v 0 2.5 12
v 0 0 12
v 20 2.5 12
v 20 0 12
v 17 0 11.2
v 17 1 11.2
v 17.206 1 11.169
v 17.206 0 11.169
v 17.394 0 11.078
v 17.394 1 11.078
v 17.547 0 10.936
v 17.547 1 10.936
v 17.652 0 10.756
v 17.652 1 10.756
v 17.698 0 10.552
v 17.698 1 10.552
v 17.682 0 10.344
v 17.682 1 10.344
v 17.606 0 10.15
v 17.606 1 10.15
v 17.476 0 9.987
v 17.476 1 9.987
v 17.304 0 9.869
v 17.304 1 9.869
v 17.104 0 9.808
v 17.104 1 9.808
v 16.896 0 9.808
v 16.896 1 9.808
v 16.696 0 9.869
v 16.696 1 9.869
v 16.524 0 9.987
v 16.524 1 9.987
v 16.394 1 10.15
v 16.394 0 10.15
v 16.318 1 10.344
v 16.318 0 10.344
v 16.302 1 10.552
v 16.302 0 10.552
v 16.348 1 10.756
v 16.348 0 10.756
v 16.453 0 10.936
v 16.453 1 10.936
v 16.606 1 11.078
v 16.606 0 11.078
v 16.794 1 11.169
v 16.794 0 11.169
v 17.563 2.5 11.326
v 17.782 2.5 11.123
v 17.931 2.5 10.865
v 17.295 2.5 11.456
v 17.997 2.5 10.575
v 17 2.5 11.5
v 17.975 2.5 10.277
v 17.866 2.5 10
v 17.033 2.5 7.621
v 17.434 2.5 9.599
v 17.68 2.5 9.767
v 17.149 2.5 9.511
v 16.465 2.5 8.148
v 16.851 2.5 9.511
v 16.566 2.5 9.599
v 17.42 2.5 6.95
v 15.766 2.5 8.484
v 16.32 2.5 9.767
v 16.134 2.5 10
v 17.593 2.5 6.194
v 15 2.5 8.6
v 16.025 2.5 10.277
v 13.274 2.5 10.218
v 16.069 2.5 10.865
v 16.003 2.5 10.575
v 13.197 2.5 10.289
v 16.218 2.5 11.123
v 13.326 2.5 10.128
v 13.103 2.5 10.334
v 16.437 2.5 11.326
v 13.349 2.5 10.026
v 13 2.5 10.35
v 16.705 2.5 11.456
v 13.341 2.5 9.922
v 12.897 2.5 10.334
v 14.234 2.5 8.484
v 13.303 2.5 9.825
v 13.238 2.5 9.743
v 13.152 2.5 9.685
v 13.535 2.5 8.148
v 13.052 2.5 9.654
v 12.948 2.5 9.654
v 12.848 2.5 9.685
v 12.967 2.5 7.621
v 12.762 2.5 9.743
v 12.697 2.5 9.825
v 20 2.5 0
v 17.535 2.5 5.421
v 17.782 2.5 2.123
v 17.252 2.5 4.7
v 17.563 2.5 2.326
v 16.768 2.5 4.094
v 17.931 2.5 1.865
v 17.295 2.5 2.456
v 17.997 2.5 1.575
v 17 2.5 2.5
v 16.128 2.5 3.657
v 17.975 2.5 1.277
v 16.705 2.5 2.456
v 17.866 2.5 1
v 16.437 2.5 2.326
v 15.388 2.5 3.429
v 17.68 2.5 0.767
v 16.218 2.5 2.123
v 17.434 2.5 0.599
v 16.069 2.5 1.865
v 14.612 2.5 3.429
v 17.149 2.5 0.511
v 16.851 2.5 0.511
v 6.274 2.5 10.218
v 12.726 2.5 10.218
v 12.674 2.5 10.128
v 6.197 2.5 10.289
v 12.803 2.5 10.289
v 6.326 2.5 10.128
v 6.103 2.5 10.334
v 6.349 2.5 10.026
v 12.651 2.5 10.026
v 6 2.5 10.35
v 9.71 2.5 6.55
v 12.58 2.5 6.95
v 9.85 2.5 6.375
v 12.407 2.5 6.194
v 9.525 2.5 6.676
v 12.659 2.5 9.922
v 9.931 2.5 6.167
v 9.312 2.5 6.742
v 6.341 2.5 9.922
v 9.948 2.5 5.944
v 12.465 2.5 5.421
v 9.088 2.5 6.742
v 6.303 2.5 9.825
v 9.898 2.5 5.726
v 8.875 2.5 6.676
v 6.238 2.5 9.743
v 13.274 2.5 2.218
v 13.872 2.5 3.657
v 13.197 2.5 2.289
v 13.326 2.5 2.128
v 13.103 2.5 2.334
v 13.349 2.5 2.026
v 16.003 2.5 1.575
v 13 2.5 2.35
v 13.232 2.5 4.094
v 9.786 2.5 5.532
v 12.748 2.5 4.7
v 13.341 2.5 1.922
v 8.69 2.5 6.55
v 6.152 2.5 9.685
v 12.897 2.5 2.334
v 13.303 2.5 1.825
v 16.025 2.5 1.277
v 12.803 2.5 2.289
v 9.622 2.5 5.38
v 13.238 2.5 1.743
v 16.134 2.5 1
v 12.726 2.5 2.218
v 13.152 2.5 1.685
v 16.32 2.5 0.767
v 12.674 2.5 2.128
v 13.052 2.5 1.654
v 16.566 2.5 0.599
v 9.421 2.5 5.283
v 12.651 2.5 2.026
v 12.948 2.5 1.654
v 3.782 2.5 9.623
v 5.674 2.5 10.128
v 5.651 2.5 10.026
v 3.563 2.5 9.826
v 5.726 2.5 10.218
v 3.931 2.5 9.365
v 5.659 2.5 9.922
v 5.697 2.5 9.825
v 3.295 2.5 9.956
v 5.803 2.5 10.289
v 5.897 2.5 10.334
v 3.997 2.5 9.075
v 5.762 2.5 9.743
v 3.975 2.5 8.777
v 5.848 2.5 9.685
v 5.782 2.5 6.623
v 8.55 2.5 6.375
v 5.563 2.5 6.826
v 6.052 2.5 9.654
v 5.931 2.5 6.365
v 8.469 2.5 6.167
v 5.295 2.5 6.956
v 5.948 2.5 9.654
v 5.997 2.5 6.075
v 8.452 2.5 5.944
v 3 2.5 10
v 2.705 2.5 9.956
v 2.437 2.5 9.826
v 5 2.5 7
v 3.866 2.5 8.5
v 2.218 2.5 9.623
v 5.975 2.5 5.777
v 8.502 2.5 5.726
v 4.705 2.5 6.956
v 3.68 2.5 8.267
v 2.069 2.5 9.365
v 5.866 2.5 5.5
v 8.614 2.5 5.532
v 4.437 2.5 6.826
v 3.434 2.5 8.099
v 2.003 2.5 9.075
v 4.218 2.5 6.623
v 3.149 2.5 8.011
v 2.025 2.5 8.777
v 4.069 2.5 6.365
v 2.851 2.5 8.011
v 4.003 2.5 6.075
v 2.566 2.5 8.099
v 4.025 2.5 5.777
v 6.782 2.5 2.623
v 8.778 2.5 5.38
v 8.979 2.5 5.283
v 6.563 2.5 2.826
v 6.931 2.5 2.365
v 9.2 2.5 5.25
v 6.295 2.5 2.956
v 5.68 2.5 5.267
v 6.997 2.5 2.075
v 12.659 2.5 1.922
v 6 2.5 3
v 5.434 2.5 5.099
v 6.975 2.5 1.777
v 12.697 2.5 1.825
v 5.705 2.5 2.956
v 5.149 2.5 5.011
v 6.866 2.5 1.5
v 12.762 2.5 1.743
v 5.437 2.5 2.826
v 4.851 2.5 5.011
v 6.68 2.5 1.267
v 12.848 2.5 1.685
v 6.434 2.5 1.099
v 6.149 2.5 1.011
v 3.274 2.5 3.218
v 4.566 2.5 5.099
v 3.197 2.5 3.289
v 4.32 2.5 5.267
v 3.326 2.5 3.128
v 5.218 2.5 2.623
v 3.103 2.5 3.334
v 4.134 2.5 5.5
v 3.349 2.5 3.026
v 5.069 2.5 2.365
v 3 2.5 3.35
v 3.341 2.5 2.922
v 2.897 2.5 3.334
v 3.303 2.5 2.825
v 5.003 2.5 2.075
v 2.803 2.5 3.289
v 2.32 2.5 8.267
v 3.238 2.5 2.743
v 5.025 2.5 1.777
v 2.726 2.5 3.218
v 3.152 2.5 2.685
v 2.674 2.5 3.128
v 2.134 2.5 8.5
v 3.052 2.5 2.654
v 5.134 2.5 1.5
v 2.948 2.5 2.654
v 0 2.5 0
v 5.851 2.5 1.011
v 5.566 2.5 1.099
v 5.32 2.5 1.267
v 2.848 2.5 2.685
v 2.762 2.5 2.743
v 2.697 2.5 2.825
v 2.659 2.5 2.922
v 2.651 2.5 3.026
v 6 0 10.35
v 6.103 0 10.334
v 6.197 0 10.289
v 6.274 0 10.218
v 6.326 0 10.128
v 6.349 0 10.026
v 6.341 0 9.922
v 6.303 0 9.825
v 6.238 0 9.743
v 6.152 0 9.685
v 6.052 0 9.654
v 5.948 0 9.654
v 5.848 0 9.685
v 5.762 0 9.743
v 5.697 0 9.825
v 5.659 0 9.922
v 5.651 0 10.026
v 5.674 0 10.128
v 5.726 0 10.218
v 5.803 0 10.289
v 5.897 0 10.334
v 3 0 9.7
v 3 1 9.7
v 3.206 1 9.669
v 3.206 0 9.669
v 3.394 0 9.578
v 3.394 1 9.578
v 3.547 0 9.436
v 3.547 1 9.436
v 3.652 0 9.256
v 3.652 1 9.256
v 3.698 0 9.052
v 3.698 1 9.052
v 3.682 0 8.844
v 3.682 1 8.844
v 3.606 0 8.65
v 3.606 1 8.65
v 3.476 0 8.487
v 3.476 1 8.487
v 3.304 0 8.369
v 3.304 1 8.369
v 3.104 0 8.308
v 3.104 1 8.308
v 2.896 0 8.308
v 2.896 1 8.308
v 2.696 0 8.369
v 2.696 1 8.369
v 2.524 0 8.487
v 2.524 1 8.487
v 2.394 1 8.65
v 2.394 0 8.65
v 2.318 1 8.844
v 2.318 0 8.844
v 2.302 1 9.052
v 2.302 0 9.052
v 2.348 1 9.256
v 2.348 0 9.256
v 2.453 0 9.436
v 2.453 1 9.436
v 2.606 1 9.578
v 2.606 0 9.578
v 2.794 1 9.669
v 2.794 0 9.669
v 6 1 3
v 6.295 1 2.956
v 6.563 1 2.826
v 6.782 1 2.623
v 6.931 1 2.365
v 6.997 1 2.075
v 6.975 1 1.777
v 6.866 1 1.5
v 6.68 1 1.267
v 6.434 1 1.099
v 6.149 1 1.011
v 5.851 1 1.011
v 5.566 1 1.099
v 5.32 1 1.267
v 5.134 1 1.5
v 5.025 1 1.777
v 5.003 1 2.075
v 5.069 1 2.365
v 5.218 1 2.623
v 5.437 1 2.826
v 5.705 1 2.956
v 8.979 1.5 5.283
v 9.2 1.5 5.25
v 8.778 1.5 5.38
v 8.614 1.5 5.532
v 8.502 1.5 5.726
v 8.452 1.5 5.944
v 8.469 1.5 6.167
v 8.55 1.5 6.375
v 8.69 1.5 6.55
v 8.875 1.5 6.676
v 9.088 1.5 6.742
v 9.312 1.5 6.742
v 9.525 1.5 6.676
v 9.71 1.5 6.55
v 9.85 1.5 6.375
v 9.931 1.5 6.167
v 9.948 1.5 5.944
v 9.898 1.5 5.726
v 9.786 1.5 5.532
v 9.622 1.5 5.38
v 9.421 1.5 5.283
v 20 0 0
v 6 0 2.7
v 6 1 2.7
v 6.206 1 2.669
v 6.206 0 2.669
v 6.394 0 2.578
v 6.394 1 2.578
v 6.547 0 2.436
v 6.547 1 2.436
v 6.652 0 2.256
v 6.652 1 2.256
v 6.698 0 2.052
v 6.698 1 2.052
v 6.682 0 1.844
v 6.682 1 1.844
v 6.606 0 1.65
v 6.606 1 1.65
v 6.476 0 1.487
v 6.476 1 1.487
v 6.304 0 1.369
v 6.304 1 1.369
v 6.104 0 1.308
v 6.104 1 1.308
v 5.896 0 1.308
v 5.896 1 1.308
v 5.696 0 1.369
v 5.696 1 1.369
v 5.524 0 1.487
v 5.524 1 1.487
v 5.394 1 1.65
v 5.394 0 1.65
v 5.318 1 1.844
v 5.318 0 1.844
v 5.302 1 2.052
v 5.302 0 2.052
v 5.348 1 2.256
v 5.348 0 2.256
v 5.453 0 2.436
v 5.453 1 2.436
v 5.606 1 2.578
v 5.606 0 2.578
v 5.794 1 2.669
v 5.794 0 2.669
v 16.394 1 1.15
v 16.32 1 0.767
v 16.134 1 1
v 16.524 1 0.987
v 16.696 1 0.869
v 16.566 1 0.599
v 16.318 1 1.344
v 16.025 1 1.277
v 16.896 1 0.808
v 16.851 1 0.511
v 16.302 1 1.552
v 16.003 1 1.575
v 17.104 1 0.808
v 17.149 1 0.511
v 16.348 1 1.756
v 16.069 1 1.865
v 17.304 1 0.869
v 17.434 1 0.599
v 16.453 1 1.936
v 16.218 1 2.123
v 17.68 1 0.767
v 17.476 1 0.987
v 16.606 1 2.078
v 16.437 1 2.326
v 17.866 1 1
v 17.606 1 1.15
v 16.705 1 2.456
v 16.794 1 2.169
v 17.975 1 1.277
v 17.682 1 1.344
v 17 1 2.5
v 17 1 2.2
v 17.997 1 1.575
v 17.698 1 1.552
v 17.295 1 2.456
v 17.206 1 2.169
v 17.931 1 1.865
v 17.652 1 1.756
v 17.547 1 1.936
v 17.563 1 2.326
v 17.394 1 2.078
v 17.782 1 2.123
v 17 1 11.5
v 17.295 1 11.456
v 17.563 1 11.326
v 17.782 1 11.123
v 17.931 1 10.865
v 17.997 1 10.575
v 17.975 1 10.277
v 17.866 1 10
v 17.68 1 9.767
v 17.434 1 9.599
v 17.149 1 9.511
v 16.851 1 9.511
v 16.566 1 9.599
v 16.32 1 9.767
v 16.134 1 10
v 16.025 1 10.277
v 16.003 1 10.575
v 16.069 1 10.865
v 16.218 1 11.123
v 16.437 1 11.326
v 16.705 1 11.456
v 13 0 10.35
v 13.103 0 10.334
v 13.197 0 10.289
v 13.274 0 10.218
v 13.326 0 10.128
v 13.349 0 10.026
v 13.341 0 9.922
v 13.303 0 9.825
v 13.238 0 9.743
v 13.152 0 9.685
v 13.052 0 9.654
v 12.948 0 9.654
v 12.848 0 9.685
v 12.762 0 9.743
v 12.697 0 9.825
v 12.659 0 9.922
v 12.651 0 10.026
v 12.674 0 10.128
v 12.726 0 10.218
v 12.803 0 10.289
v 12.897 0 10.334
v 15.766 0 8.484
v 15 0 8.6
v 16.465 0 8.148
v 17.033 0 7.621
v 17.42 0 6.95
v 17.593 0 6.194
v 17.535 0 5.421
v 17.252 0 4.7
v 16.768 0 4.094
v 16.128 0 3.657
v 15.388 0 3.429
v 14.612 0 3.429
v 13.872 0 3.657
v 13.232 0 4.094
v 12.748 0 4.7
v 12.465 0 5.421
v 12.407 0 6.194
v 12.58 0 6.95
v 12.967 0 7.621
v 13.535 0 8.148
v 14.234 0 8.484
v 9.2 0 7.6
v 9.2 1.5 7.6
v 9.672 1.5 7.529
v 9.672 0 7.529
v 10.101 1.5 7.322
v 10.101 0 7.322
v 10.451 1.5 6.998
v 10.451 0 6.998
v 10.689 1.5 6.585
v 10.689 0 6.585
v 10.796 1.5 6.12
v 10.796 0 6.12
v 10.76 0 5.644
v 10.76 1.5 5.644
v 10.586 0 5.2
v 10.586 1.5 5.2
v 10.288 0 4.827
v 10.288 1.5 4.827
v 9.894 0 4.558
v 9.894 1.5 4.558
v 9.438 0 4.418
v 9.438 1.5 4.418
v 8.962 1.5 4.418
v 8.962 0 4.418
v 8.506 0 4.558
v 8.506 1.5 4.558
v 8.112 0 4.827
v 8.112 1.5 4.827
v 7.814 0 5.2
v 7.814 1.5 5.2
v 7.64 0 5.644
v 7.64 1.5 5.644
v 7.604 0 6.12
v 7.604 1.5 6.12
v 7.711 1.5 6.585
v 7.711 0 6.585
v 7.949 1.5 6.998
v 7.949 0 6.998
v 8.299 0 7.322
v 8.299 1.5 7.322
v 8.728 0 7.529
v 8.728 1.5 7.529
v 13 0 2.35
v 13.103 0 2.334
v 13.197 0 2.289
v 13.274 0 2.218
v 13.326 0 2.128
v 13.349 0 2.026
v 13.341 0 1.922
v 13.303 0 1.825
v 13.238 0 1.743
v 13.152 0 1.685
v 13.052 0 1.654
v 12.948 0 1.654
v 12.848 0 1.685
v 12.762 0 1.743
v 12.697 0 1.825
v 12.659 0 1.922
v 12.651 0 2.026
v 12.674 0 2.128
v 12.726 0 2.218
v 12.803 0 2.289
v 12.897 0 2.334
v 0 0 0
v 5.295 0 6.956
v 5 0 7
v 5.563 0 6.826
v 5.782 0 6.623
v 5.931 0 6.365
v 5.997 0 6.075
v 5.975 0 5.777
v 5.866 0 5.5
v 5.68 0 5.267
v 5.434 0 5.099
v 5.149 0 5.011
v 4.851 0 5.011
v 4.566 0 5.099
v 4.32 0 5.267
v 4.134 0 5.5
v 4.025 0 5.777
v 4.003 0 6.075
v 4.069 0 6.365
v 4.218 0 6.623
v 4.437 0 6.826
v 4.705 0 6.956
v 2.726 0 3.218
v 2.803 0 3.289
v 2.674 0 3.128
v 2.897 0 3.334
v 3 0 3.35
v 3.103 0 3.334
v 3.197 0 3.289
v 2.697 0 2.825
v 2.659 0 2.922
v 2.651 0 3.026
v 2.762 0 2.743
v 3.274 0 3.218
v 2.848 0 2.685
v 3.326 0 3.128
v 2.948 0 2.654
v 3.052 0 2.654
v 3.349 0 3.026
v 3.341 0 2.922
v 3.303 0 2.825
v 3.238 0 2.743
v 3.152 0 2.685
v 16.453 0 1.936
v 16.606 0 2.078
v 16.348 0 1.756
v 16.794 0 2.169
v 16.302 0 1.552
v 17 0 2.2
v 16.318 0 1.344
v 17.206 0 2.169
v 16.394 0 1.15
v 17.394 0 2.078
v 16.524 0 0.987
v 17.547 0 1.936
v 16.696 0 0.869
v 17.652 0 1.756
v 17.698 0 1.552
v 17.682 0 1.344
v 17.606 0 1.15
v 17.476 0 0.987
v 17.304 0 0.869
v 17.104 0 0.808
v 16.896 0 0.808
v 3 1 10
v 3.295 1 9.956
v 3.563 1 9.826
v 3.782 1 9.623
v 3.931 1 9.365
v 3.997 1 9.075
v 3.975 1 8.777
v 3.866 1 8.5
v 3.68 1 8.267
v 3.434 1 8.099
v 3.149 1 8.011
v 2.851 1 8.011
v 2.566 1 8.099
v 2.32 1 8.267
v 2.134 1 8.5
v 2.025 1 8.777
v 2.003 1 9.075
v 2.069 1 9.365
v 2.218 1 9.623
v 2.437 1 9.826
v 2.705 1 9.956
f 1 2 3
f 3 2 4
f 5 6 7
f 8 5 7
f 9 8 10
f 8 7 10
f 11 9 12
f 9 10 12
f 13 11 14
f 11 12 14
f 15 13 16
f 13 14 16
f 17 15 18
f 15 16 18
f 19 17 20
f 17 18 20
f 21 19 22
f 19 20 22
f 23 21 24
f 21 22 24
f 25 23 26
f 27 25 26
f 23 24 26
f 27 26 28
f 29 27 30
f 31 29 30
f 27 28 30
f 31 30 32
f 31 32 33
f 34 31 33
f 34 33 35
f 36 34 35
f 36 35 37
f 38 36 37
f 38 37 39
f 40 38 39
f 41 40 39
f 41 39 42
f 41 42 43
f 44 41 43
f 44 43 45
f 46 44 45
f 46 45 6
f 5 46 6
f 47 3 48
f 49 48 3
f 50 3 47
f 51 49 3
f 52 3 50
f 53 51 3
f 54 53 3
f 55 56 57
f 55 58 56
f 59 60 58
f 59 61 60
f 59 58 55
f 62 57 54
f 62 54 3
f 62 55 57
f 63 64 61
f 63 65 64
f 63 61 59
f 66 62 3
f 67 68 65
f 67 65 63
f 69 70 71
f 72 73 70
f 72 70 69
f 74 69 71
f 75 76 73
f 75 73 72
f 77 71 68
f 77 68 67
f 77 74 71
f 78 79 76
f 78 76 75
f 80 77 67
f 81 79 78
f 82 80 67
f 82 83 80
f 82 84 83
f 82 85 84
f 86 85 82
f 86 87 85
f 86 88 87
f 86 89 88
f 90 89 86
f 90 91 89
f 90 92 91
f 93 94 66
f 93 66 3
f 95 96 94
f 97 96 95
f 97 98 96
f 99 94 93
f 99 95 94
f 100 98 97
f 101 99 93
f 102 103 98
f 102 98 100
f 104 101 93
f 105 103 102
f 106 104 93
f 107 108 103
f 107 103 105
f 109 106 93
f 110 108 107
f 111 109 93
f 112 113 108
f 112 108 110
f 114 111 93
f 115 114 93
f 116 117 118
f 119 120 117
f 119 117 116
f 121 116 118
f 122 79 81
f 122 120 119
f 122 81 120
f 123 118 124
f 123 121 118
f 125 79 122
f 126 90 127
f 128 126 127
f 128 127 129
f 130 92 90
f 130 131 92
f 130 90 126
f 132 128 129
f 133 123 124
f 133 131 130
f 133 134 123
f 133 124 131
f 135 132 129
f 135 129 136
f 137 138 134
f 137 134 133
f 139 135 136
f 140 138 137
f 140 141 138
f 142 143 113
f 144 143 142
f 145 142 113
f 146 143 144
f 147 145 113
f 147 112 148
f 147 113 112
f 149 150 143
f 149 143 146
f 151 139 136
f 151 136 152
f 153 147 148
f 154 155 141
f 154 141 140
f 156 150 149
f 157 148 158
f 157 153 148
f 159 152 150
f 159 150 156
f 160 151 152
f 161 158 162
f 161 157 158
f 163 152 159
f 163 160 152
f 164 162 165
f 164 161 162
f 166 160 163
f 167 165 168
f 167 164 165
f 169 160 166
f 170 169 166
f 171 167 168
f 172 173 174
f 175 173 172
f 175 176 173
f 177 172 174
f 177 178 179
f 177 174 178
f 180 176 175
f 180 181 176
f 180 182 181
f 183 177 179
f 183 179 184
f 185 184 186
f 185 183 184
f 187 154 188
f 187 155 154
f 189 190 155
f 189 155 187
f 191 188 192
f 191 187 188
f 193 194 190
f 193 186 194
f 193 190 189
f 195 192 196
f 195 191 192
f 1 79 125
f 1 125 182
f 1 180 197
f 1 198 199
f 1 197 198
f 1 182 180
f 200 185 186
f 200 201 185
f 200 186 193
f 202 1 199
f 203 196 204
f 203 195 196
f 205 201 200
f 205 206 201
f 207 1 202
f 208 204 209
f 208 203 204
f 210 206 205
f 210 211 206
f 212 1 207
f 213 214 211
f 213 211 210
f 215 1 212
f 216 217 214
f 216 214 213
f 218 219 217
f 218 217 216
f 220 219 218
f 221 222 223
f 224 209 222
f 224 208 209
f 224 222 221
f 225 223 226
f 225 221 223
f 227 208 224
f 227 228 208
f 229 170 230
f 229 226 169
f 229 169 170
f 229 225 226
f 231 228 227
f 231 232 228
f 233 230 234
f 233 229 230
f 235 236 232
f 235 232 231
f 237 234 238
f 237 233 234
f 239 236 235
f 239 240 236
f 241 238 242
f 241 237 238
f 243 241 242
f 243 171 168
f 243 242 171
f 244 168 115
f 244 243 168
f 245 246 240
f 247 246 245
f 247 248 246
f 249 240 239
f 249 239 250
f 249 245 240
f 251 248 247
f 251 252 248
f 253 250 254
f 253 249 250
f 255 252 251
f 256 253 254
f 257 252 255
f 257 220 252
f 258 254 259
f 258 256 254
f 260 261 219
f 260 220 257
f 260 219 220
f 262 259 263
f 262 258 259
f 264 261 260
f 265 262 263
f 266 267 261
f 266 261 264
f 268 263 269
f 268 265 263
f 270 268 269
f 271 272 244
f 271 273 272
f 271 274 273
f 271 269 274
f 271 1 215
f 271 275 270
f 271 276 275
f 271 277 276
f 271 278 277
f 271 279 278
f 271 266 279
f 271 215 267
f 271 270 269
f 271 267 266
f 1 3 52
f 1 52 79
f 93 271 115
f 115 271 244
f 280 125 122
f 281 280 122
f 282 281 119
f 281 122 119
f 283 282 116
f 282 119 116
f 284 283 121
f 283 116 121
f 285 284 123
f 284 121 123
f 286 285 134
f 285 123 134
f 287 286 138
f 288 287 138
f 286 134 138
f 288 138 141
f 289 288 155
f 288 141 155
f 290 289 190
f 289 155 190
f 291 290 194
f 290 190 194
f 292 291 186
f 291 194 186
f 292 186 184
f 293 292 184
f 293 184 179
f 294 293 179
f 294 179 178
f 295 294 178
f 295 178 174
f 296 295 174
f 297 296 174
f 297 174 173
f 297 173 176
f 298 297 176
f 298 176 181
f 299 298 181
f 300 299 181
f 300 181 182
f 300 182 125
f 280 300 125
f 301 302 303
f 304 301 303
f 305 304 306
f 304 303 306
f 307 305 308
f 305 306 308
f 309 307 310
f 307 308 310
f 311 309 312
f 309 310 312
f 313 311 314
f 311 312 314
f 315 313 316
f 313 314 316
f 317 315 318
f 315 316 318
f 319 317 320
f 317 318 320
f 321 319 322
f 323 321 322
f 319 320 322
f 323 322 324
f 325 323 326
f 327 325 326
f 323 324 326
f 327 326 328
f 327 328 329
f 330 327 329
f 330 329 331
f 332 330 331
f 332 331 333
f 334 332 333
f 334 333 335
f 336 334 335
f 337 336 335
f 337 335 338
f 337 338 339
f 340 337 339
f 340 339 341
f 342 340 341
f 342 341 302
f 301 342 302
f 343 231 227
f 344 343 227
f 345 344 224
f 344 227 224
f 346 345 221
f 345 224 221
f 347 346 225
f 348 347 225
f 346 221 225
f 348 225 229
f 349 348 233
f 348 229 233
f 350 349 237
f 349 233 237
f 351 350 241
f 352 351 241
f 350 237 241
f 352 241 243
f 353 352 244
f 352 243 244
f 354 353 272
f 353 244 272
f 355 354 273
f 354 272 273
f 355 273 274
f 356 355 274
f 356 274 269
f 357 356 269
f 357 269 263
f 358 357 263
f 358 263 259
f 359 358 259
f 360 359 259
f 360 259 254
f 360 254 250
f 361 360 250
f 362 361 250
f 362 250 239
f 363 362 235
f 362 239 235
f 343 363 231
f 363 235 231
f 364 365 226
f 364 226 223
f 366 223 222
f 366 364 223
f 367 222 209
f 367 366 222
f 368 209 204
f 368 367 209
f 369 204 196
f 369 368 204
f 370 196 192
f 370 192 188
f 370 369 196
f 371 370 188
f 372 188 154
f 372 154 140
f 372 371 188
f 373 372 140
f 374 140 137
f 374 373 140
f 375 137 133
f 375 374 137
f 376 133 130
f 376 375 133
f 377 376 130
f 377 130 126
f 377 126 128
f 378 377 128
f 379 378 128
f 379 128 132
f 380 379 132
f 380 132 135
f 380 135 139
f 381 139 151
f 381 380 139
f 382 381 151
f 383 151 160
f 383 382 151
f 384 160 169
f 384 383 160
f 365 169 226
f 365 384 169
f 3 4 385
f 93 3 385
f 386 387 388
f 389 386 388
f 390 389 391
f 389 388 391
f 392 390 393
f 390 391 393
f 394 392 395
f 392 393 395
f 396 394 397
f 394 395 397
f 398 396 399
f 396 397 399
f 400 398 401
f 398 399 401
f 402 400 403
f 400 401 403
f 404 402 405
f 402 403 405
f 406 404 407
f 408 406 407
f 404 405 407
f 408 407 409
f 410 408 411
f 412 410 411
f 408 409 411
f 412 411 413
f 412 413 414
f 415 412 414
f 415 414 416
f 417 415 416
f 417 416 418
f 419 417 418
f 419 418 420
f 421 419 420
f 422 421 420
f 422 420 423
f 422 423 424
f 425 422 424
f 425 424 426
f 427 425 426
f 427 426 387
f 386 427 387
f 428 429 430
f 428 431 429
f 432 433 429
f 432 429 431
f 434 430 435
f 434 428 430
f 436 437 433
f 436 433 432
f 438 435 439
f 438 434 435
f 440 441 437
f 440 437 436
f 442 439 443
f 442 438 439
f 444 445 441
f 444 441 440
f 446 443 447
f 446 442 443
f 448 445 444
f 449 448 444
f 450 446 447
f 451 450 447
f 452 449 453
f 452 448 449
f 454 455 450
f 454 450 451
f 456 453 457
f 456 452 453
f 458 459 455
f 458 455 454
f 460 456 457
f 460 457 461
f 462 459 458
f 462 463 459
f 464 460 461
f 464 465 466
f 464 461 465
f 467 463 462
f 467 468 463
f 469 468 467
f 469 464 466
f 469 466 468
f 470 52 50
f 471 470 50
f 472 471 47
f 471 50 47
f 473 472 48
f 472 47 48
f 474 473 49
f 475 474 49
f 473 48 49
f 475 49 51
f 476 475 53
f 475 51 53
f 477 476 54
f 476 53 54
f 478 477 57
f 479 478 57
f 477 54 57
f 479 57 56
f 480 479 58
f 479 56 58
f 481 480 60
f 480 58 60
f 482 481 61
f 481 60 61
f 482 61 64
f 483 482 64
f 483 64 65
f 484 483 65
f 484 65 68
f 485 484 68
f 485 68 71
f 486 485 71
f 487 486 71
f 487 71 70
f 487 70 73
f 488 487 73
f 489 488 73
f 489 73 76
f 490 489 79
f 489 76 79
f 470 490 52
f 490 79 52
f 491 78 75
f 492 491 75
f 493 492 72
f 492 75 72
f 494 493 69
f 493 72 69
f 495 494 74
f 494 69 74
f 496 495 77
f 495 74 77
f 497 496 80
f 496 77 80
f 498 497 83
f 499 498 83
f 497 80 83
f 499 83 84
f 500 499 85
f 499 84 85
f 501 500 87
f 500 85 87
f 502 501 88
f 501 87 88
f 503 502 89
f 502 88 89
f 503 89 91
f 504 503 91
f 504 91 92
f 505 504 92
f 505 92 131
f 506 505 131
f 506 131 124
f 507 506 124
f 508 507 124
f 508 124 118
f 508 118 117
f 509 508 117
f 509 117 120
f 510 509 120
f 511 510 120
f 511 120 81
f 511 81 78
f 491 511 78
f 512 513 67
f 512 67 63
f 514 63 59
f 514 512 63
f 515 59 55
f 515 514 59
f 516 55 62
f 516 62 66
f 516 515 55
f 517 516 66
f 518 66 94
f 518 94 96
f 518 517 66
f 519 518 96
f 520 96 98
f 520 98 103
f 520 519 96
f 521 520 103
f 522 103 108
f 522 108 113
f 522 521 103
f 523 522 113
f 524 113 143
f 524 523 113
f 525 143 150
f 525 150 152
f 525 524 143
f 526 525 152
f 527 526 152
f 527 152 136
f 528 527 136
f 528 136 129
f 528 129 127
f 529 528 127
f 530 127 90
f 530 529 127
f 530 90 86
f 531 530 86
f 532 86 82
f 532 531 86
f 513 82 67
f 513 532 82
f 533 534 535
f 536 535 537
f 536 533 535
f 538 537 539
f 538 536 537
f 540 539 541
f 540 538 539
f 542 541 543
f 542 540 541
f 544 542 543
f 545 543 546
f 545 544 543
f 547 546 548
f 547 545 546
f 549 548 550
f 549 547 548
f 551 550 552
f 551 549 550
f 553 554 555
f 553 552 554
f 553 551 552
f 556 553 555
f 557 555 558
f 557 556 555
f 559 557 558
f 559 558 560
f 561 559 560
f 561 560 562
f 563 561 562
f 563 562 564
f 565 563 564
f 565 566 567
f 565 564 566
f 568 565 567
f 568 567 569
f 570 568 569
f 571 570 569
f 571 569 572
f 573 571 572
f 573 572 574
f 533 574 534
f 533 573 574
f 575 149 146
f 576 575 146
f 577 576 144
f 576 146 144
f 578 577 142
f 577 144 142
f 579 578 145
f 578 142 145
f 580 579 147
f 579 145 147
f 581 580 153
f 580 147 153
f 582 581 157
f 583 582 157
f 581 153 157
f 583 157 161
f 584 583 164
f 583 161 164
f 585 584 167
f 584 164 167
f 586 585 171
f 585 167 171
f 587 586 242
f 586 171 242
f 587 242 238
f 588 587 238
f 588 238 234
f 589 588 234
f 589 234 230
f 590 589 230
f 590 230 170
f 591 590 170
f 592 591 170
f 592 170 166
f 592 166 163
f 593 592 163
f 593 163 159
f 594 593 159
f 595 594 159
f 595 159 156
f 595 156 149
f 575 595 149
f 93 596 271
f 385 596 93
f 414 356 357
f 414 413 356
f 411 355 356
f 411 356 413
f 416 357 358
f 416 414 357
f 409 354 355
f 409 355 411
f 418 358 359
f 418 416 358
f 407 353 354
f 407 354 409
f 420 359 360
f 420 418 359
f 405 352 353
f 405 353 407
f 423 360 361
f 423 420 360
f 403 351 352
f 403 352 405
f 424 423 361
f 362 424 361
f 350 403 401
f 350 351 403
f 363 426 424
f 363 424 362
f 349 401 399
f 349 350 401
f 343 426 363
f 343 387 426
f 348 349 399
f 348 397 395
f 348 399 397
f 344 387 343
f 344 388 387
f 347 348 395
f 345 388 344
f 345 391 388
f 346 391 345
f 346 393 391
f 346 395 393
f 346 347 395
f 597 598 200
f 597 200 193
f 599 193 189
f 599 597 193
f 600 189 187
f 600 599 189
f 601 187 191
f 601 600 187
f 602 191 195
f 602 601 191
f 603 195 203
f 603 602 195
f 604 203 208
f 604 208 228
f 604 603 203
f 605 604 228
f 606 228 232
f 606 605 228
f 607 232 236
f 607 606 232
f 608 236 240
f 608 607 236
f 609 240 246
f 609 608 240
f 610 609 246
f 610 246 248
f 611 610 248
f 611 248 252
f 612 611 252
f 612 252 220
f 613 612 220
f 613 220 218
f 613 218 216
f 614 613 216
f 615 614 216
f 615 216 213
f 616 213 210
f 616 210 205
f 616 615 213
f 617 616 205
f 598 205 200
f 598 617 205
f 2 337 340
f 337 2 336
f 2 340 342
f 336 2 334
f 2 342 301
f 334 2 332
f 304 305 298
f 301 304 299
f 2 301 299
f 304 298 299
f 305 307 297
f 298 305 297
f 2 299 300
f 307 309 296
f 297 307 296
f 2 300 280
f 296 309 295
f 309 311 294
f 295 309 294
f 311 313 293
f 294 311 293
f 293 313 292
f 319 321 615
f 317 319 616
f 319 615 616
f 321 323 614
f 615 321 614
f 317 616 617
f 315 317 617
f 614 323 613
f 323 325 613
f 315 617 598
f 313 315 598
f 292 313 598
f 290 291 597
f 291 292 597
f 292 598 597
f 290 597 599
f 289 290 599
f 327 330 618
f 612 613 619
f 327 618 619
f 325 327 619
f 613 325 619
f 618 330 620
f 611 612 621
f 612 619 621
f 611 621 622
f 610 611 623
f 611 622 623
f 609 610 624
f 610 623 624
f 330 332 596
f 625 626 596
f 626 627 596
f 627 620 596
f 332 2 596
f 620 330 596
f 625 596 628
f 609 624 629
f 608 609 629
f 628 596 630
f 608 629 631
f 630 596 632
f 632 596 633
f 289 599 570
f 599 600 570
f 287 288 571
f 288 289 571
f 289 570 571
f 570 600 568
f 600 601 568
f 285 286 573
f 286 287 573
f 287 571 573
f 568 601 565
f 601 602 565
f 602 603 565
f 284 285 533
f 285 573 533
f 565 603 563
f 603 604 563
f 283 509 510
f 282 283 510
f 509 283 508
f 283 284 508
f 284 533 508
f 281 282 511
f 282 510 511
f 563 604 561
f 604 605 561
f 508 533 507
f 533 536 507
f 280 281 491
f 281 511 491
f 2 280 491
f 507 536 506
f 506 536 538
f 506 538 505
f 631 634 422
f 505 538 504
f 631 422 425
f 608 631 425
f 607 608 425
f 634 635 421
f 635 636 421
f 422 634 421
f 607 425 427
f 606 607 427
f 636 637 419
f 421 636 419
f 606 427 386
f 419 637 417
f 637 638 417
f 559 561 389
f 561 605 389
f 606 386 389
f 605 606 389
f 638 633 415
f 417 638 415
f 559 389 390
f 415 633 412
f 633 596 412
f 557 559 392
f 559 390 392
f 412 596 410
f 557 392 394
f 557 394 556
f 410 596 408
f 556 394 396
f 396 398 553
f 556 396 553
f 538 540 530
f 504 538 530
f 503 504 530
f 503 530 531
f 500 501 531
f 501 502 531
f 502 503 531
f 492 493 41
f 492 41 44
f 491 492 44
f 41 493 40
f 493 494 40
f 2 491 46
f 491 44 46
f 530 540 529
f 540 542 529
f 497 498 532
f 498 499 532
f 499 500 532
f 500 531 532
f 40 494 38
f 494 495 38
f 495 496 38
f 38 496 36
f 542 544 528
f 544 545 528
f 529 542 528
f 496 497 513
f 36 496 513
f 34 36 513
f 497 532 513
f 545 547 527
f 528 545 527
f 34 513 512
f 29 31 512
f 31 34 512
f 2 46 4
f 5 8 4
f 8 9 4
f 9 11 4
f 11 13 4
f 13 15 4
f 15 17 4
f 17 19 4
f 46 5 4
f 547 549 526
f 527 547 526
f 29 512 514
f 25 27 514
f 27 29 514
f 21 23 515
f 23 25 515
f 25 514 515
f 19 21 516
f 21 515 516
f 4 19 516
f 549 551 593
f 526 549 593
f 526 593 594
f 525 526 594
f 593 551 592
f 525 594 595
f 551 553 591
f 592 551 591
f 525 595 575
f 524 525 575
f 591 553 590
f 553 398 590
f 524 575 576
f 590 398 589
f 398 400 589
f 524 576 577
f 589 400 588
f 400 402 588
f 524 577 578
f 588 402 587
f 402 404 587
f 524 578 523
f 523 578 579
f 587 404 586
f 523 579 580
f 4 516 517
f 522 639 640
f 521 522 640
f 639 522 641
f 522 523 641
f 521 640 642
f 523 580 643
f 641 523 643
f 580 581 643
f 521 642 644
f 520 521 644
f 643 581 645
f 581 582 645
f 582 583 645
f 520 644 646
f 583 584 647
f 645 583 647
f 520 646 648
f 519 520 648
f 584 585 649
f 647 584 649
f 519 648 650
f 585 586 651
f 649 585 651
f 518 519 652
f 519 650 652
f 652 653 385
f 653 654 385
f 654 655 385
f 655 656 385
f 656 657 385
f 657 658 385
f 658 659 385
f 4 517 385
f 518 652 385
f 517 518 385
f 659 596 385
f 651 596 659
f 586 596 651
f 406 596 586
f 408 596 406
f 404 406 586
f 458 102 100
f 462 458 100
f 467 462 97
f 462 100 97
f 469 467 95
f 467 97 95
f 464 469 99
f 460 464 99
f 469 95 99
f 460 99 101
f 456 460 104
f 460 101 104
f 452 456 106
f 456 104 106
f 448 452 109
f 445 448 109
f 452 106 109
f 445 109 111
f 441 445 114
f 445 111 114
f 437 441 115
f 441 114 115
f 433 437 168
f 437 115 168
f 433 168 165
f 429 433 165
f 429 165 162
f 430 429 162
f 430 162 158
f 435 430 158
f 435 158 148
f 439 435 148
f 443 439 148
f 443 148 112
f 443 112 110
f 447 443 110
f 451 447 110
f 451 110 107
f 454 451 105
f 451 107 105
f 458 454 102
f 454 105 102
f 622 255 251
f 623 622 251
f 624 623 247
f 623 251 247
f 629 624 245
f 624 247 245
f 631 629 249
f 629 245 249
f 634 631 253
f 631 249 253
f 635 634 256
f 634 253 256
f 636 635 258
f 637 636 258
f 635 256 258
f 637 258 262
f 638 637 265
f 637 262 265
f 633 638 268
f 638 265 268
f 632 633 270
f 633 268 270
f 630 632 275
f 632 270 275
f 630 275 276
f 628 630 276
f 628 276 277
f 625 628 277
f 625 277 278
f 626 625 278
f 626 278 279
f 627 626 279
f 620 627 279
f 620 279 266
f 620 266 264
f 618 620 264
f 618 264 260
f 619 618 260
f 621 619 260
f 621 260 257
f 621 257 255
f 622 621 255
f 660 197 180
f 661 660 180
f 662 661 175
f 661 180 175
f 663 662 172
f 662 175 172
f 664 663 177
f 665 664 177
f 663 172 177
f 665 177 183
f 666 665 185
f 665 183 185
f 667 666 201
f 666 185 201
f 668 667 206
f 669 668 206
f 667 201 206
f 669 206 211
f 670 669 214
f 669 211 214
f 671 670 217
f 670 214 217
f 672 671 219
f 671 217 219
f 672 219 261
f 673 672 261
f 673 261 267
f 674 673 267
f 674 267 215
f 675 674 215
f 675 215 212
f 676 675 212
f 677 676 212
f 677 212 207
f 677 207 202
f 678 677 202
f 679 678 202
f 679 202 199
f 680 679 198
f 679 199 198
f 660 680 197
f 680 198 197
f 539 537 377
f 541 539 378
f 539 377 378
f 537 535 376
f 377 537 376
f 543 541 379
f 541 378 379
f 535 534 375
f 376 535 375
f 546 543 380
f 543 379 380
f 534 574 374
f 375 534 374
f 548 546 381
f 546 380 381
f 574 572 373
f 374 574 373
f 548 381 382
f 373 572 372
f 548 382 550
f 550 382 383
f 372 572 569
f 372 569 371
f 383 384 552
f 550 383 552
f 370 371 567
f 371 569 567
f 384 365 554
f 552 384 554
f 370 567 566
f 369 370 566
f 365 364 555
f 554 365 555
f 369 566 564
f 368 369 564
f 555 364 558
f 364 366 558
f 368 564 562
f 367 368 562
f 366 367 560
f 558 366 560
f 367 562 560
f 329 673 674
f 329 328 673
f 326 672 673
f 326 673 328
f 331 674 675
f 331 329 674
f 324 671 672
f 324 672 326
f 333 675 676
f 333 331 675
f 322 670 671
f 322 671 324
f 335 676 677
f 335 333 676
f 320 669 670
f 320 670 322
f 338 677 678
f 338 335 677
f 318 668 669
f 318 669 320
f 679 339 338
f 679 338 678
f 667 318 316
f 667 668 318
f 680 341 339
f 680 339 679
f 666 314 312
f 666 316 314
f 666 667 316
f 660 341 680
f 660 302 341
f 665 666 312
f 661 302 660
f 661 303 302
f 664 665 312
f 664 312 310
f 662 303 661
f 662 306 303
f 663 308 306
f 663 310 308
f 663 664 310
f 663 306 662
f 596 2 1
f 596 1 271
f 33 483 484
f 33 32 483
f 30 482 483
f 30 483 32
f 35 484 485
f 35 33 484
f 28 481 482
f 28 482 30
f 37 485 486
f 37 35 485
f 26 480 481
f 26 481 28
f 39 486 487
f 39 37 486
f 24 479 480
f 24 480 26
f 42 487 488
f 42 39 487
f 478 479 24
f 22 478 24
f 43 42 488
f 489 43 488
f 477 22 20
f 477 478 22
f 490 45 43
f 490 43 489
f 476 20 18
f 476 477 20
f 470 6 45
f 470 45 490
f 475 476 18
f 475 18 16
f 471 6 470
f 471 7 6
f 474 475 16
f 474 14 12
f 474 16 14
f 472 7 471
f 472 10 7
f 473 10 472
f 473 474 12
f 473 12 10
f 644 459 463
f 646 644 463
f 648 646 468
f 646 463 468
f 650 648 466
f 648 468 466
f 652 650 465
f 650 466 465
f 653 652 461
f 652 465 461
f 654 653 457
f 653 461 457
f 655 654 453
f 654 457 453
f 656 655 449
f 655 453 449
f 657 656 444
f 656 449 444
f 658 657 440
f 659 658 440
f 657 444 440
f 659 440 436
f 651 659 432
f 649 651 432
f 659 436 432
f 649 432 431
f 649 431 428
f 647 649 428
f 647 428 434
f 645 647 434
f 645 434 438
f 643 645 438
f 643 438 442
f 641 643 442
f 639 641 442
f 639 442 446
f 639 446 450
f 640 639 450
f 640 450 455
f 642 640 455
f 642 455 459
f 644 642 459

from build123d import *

# Parameters (mm, degrees)
SKETCH_1_W          = 20
SKETCH_1_H          = 12
SKETCH_1_R          = 1.6
SKETCH_1_R_2        = 2.6
SKETCH_1_R_3        = 1
EXTRUDE_1_DEPTH     = 2.5
EXTRUDE_START       = 1.5
SKETCH_1_5_R        = 1.6
SKETCH_1_5_R_2      = 0.75
EXTRUDE_2_DEPTH     = 1
SKETCH_3_R          = 0.7
SKETCH_3_R_2        = 0.35
CUT_EXTRUDE_1_DEPTH = 24.457408211
SKETCH_3_3_R        = 1
CUT_EXTRUDE_2_DEPTH = 1.5


with BuildPart() as part:
    # 草图1 → 凸台-拉伸1 (new body)
    with BuildSketch(Plane(origin=(0, 0, 0), x_dir=(1, 0, 0), z_dir=(0, 1, 0))):
        with Locations((10, -6)):
            Rectangle(SKETCH_1_W, SKETCH_1_H)
        with Locations(Location((9.2, -6, 0), (0, 0, 270))):
            Circle(SKETCH_1_R, mode=Mode.SUBTRACT)
        with Locations(Location((15, -6, 0), (0, 0, 270))):
            Circle(SKETCH_1_R_2, mode=Mode.SUBTRACT)
        with Locations(Location((5, -6, 0), (0, 0, 270))):
            Circle(SKETCH_1_R_3, mode=Mode.SUBTRACT)
    extrude(amount=EXTRUDE_1_DEPTH)

    # 草图1<5> → 凸台-拉伸2 (add)
    with BuildSketch(Plane(origin=(0, 0, 0), x_dir=(1, 0, 0), z_dir=(0, 1, 0)).offset(EXTRUDE_START)):
        with Locations(Location((9.2, -6, 0), (0, 0, 90))):
            Circle(SKETCH_1_5_R)
        with Locations(Location((9.2, -6, 0), (0, 0, 90))):
            Circle(SKETCH_1_5_R_2, mode=Mode.SUBTRACT)
    extrude(amount=EXTRUDE_2_DEPTH)

    # 草图3 → 切除-拉伸1 (cut, through all)
    with BuildSketch(Plane(origin=(0, 2.5, 0), x_dir=(1, 0, 0), z_dir=(0, 1, 0))):
        with Locations(Location((3, -9, 0), (0, 0, 270))):
            Circle(SKETCH_3_R)
        with Locations(Location((6, -2, 0), (0, 0, 270))):
            Circle(SKETCH_3_R)
        with Locations(Location((17, -1.5, 0), (0, 0, 270))):
            Circle(SKETCH_3_R)
        with Locations(Location((17, -10.5, 0), (0, 0, 270))):
            Circle(SKETCH_3_R)
        with Locations(Location((3, -3, 0), (0, 0, 270))):
            Circle(SKETCH_3_R_2)
        with Locations(Location((6, -10, 0), (0, 0, 270))):
            Circle(SKETCH_3_R_2)
        with Locations(Location((13, -10, 0), (0, 0, 270))):
            Circle(SKETCH_3_R_2)
        with Locations(Location((13, -2, 0), (0, 0, 270))):
            Circle(SKETCH_3_R_2)
    extrude(amount=-CUT_EXTRUDE_1_DEPTH, mode=Mode.SUBTRACT)

    # 草图3<3> → 切除-拉伸2 (cut)
    with BuildSketch(Plane(origin=(0, 2.5, 0), x_dir=(1, 0, 0), z_dir=(0, 1, 0))):
        with Locations(Location((6, -2, 0), (0, 0, 270))):
            Circle(SKETCH_3_3_R)
        with Locations(Location((3, -9, 0), (0, 0, 270))):
            Circle(SKETCH_3_3_R)
        with Locations(Location((17, -1.5, 0), (0, 0, 270))):
            Circle(SKETCH_3_3_R)
        with Locations(Location((17, -10.5, 0), (0, 0, 270))):
            Circle(SKETCH_3_3_R)
    extrude(amount=-CUT_EXTRUDE_2_DEPTH, mode=Mode.SUBTRACT)


solid = part.part
